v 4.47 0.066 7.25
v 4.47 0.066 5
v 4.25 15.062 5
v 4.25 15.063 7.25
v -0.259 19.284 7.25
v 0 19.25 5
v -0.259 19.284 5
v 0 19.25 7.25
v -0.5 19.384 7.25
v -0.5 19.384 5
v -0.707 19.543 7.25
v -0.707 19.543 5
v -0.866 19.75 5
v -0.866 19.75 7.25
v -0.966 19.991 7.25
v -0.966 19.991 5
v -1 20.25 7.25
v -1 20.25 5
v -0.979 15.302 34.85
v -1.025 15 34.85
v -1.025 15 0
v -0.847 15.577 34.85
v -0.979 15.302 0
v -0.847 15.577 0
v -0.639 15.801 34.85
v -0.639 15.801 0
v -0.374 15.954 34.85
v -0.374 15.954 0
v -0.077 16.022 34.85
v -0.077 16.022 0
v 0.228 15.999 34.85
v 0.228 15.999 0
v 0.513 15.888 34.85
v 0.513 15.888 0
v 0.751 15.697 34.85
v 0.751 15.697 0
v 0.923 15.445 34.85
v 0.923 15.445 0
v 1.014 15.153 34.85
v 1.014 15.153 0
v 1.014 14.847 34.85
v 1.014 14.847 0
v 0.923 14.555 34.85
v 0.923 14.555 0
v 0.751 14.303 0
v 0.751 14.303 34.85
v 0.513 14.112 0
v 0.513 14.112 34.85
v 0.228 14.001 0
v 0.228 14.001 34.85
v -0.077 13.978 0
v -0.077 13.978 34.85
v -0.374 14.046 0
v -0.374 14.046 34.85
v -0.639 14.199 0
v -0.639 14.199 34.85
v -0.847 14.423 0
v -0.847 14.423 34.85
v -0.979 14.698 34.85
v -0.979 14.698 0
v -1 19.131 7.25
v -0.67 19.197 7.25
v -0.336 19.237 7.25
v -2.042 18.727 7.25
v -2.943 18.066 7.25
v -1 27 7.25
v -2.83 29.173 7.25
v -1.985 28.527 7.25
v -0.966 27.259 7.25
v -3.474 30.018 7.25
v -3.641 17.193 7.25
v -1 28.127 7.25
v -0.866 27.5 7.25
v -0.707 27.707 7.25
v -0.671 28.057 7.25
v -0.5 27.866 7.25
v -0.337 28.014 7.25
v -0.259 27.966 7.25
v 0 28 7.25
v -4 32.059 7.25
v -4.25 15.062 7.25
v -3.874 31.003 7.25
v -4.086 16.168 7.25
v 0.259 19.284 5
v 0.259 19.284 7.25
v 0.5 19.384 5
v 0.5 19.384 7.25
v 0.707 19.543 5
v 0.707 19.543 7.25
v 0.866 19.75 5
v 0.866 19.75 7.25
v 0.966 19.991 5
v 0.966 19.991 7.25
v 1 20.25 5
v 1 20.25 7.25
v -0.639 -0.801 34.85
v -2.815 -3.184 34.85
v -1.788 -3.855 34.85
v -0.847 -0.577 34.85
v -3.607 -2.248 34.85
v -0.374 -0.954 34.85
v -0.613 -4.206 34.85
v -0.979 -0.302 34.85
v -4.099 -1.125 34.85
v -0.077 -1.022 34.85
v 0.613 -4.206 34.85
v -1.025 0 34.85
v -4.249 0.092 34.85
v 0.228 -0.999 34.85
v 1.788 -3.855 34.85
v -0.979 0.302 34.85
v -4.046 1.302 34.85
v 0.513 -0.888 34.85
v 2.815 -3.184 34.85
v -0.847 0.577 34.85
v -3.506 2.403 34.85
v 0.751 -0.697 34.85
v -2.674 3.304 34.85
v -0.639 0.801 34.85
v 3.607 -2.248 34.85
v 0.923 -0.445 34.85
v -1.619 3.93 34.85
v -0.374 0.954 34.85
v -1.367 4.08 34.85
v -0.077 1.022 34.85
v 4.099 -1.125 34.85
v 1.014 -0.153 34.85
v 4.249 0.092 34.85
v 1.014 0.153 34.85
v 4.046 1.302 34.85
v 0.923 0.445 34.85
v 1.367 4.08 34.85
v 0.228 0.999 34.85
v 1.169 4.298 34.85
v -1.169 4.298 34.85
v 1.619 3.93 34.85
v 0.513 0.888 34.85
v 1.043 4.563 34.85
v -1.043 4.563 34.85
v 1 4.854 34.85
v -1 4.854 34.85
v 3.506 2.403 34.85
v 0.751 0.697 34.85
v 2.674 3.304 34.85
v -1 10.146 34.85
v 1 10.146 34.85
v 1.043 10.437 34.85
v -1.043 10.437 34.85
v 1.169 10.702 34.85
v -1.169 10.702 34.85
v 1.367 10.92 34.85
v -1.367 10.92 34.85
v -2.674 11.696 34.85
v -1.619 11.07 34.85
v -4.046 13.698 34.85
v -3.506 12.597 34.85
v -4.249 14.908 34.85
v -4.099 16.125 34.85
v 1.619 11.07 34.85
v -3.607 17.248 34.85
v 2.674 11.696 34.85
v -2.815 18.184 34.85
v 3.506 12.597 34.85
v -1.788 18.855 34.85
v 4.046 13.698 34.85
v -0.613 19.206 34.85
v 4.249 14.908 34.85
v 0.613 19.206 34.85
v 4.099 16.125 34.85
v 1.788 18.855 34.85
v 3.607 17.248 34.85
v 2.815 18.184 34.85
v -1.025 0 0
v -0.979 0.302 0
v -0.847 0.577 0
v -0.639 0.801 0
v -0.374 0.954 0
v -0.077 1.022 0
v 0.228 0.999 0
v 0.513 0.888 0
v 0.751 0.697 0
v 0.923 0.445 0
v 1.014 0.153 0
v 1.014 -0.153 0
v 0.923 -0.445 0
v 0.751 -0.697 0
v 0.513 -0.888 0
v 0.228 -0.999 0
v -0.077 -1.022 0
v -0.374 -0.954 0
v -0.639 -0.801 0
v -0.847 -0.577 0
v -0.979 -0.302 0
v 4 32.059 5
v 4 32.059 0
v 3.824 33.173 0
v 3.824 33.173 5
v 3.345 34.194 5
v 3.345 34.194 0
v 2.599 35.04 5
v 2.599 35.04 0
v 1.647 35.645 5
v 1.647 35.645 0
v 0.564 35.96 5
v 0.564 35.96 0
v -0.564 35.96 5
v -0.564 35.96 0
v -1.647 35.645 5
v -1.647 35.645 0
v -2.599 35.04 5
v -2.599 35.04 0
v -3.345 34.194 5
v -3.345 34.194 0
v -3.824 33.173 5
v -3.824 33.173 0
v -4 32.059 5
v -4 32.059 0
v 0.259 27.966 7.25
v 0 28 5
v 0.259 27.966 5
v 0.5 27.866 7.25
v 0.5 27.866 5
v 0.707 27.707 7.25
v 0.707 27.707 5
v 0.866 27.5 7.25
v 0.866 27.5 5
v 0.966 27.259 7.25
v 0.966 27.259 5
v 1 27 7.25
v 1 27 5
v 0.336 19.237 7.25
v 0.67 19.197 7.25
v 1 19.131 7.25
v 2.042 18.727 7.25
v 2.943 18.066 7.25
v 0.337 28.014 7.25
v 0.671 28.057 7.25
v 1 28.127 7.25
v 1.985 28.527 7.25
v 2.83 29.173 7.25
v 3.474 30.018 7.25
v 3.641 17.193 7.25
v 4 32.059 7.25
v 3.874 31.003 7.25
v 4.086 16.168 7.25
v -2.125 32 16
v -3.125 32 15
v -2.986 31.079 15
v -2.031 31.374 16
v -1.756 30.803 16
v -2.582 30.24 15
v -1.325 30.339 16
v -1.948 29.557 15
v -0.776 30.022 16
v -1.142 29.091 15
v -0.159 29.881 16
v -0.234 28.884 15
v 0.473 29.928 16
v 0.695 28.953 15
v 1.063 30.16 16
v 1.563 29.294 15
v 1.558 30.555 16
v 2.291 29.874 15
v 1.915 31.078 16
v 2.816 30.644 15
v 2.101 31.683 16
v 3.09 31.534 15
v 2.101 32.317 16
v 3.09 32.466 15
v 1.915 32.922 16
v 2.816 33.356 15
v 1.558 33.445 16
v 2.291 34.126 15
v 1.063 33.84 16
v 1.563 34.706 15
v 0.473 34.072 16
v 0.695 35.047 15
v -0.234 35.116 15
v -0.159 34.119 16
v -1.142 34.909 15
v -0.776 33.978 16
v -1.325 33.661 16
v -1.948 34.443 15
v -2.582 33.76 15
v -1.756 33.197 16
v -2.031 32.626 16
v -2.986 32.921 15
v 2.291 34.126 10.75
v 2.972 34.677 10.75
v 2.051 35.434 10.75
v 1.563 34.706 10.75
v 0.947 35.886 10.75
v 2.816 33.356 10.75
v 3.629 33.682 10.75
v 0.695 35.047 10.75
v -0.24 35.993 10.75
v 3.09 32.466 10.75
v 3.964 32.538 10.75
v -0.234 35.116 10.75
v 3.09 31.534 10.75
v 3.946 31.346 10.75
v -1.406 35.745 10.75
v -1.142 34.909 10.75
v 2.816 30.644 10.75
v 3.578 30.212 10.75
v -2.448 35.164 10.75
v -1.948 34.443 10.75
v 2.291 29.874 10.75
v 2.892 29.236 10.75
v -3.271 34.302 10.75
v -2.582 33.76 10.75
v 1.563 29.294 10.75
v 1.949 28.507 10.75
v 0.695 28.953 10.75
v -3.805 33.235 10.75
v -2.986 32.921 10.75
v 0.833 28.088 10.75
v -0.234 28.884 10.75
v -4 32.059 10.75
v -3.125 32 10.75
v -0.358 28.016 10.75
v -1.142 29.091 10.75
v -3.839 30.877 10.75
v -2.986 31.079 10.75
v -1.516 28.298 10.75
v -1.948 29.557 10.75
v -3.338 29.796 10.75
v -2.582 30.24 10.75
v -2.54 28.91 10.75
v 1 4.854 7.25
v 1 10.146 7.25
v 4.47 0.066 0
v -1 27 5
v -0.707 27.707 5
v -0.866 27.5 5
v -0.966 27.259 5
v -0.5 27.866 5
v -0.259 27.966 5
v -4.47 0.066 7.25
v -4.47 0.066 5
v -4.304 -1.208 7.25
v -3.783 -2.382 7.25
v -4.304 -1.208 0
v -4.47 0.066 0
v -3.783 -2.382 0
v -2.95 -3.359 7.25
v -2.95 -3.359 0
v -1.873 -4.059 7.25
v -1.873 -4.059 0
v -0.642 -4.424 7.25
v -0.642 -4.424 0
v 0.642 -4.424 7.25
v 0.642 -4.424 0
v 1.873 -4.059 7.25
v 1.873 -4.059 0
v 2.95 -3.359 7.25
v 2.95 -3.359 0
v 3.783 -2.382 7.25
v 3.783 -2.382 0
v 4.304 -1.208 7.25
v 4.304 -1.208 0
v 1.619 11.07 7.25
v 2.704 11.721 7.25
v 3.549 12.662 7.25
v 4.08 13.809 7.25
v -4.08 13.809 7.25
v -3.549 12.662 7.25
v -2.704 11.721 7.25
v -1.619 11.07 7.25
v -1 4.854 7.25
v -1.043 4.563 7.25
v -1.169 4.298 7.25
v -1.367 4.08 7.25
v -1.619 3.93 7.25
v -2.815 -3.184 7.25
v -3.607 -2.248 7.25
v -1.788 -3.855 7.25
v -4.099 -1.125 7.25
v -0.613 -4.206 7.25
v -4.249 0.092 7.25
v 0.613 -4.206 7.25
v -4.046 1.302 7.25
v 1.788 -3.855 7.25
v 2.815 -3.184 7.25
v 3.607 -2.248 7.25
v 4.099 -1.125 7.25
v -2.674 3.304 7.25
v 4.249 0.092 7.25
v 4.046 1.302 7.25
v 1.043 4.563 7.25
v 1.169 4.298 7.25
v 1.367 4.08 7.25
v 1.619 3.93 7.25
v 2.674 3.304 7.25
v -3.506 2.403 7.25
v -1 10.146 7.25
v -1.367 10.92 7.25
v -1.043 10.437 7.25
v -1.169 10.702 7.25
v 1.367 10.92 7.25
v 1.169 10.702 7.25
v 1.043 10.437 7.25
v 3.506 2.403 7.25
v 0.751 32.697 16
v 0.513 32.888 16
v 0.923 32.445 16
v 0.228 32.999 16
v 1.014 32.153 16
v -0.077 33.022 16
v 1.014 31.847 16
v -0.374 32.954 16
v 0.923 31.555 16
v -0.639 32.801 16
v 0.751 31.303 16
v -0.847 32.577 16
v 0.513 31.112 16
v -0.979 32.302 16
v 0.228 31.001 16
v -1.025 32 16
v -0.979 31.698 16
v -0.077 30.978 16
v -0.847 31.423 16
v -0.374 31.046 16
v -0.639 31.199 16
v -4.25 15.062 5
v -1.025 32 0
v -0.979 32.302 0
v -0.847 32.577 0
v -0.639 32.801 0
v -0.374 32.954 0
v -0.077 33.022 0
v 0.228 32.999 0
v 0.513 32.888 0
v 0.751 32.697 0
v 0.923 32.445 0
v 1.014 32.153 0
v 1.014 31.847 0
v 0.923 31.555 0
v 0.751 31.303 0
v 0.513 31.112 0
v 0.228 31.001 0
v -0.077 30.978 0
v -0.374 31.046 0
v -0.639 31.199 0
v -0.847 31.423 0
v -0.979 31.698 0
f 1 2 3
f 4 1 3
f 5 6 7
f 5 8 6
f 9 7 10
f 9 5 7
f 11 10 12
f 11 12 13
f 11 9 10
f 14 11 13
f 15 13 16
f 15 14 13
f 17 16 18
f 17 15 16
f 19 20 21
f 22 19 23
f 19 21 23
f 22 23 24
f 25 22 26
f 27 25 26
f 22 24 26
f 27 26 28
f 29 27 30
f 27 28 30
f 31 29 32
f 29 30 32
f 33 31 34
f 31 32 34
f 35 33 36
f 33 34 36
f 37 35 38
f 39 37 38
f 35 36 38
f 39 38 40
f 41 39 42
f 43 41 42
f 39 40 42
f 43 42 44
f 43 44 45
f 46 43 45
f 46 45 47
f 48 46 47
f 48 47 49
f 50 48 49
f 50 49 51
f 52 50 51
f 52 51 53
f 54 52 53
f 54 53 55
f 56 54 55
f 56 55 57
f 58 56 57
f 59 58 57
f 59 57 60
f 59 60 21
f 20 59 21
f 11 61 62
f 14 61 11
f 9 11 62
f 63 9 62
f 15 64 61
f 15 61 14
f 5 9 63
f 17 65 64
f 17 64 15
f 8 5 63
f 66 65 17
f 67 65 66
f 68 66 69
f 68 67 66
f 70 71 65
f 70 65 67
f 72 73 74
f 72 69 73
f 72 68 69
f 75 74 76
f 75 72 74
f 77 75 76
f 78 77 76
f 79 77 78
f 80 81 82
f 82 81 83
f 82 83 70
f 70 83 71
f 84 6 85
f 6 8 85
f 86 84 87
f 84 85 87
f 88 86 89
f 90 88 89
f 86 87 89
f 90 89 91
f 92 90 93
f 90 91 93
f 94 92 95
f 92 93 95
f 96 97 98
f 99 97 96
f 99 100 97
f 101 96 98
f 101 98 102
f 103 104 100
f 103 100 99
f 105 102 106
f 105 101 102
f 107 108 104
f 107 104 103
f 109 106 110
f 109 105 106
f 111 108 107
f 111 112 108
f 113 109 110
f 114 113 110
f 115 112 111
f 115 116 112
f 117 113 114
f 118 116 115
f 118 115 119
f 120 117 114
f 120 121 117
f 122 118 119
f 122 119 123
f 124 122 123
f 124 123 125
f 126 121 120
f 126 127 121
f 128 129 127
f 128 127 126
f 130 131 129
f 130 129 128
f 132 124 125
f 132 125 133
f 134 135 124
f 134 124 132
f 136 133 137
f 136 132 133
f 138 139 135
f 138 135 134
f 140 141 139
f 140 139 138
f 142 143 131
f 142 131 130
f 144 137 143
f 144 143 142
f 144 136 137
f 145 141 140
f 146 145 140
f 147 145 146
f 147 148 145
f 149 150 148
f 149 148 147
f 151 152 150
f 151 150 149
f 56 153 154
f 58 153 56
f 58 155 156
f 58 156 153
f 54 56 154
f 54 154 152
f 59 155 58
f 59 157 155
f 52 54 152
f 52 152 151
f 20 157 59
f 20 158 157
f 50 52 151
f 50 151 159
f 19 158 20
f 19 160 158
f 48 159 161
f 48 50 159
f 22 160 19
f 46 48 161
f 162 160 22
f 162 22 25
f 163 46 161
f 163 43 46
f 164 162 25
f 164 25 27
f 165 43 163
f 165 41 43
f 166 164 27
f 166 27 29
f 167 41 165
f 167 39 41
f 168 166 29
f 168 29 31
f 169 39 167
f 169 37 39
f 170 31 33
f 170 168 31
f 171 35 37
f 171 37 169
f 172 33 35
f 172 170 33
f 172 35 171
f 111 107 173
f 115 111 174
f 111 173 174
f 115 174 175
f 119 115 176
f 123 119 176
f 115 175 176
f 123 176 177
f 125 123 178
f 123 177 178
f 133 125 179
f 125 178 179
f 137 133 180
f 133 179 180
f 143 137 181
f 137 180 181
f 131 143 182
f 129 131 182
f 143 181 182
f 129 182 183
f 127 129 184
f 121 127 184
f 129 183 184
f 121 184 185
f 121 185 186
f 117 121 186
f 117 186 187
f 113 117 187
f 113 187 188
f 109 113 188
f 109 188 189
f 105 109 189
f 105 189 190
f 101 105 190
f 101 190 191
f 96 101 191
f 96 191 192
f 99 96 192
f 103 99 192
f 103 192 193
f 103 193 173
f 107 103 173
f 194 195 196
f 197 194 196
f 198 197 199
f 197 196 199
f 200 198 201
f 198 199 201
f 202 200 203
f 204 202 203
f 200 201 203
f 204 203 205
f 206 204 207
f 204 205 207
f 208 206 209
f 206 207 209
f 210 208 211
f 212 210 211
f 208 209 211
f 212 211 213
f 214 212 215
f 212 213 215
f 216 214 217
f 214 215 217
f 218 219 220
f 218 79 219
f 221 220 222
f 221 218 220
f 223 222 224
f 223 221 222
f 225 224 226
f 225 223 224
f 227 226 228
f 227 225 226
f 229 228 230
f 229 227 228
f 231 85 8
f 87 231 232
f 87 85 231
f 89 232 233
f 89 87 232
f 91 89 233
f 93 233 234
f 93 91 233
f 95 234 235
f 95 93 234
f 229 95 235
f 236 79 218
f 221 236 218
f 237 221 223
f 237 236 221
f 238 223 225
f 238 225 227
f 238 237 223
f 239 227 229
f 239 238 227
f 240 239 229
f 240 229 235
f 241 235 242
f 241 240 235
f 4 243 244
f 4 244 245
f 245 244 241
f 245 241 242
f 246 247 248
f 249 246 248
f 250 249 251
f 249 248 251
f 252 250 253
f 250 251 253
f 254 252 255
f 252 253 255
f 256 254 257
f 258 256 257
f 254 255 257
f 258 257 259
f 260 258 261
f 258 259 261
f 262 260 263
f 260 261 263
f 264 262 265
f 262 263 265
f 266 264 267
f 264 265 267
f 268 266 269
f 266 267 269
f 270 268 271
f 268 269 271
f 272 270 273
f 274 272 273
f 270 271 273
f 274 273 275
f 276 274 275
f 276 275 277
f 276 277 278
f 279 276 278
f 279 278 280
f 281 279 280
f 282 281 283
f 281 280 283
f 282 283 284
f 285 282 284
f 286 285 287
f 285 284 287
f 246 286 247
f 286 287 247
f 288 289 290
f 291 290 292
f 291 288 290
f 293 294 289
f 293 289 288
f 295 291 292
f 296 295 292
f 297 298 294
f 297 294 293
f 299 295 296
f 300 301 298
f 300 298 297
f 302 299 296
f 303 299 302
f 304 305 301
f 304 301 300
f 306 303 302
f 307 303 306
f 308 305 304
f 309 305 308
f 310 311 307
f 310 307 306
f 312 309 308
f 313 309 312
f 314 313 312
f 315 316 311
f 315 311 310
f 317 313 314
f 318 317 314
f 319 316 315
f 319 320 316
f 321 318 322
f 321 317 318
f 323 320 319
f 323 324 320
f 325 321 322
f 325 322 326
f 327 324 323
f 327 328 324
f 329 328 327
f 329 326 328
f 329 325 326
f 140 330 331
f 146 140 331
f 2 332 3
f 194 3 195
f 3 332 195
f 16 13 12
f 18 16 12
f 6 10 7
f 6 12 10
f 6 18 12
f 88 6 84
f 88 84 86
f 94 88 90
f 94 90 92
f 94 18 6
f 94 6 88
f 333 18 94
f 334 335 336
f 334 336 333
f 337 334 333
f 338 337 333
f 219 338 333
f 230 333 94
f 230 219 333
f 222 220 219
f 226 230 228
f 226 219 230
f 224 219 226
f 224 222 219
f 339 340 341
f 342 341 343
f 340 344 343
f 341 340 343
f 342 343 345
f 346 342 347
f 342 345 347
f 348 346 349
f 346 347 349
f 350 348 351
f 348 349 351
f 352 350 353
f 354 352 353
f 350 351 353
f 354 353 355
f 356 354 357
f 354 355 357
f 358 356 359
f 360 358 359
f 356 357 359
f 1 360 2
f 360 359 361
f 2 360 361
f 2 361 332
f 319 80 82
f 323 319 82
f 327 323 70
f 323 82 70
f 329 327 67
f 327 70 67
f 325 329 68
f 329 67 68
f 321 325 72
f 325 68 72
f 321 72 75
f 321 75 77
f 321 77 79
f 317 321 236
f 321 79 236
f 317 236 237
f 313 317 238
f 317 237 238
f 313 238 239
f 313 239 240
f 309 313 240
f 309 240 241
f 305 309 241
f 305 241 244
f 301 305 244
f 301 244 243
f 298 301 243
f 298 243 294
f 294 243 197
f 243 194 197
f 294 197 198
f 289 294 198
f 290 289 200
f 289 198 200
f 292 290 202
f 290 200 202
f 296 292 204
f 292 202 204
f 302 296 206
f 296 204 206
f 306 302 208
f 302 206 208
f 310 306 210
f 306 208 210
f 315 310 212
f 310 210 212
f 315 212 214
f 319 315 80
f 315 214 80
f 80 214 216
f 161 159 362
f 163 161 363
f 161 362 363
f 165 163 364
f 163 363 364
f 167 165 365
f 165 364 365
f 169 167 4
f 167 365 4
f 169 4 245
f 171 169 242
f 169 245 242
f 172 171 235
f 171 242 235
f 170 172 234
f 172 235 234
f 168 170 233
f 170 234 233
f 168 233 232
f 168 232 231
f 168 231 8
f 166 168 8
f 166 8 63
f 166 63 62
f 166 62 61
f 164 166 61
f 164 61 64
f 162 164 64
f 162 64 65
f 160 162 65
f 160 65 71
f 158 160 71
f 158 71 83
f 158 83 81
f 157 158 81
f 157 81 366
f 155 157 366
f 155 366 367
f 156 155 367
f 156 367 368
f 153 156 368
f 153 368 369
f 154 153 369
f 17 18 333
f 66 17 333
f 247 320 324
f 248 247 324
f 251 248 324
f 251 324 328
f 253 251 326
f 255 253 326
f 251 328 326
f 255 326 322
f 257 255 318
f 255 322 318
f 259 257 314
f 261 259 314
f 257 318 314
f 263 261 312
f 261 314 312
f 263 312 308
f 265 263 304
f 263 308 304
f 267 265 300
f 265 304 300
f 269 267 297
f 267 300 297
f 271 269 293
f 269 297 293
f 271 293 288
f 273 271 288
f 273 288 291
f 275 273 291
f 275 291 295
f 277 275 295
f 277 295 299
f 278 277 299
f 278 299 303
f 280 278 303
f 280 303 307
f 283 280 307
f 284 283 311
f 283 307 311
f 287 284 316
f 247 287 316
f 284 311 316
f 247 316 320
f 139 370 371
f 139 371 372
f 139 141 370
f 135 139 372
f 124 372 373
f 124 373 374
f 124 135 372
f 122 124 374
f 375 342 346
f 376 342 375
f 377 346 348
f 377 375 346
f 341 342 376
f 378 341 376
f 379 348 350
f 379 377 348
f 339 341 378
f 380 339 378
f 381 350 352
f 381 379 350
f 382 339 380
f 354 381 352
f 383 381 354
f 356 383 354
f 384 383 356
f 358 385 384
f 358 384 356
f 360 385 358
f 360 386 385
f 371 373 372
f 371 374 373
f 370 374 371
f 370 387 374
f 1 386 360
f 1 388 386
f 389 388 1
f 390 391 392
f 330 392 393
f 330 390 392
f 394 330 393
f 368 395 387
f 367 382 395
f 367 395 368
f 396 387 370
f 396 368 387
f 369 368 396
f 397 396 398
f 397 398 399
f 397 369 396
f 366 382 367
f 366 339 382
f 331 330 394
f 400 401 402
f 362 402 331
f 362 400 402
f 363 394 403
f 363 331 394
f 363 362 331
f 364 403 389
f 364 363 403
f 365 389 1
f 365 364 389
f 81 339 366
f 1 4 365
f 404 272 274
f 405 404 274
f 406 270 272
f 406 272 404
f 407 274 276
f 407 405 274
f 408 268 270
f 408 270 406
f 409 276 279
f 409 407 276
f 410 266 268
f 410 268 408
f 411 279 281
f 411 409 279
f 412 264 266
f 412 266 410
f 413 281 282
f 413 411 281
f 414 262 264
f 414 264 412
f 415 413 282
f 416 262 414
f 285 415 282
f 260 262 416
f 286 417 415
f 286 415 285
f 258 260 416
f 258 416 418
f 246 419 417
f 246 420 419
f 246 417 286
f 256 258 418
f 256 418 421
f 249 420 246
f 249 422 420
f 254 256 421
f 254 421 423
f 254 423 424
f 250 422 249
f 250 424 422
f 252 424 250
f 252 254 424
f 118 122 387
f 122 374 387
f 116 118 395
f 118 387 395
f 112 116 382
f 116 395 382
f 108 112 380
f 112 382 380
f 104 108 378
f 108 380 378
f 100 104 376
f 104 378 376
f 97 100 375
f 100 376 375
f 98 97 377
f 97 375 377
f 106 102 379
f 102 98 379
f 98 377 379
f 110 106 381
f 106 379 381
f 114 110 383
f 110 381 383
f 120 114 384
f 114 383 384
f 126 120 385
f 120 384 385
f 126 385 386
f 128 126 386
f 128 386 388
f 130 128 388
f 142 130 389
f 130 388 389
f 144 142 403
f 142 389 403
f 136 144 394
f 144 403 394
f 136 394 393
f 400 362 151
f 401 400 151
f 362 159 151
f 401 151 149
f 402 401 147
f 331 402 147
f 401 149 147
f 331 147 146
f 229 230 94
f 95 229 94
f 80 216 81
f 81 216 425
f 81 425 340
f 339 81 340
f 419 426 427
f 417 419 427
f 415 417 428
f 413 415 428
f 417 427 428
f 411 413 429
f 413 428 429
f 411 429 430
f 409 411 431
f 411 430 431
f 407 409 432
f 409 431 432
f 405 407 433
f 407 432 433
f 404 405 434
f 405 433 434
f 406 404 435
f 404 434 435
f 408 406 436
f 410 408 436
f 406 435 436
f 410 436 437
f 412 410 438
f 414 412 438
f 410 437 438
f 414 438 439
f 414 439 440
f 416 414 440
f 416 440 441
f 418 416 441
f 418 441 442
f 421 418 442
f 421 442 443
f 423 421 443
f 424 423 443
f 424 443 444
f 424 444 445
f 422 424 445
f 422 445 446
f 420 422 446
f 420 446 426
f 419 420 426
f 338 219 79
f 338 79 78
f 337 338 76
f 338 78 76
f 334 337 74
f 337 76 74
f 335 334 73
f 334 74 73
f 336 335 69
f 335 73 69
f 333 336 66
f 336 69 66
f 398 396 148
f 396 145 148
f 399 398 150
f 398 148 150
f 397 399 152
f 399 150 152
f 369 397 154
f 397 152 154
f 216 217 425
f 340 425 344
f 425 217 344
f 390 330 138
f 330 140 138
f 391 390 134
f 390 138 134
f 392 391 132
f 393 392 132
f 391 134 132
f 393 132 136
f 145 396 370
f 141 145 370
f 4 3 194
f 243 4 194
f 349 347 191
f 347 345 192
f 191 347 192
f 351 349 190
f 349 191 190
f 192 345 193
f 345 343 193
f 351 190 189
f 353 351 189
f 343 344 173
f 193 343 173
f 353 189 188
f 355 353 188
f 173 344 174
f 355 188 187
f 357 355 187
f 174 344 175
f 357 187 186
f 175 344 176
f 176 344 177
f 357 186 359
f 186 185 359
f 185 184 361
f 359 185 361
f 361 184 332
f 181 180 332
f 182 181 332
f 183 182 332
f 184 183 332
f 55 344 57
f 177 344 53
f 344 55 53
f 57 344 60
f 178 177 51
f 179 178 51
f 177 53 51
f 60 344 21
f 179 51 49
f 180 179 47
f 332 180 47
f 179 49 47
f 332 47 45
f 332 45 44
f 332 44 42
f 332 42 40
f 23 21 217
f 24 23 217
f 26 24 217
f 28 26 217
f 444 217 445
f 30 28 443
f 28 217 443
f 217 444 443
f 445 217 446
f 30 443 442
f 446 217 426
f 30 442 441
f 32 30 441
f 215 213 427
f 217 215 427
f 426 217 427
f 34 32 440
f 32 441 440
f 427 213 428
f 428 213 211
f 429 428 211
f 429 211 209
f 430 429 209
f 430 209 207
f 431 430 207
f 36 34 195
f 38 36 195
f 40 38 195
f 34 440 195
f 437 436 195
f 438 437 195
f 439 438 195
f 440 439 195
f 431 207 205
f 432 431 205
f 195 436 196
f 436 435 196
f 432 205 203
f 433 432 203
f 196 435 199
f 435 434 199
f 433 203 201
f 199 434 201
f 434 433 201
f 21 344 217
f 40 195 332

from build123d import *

# Parameters (mm, degrees)
BOSS_EXTRUDE1_DEPTH      = 5
BOSS_EXTRUDE3_START      = 5
SKETCH1_5_R              = 4
BOSS_EXTRUDE3_DEPTH      = 5.75
BOSS_EXTRUDE2_START      = 10.75
SKETCH1_4_R              = 3.125
BOSS_EXTRUDE2_DEPTH      = 5.25
BOSS_EXTRUDE4_START      = 5
SKETCH1_6_R              = 4.25
BOSS_EXTRUDE4_DEPTH      = 29.85
BOSS_EXTRUDE5_DEPTH      = 2.25
BOSS_EXTRUDE6_DEPTH      = 29.85
FILLET1_R                = 1
M2_5X0_45_TAPPED_HOLE1_D = 2.05
CHAMFER1_SIZE            = 1


# Read off the part's stored shape, not the designer's step: Boss-Extrude5
with BuildPart() as part:
    # Sketch1 → Boss-Extrude1 (new body)
    with BuildSketch(Plane.XY):
        with BuildLine():
            ThreePointArc((3.999567451, 32.058823529), (0, 36), (-3.999567451, 32.058823529))
            Line((-3.999567451, 32.058823529), (-4.470104798, 0.065743945))
            ThreePointArc((-4.470104798, 0.065743945), (0, -4.470588235), (4.470104798, 0.065743945))
            Line((4.470104798, 0.065743945), (3.999567451, 32.058823529))
        make_face()
    extrude(amount=BOSS_EXTRUDE1_DEPTH)

    # Sketch1<5> → Boss-Extrude3 (add)
    with BuildSketch(Plane.XY.offset(BOSS_EXTRUDE3_START)):
        with Locations(Location((0, 32, 0), (0, 0, 179.157384634))):
            Circle(SKETCH1_5_R)
    extrude(amount=BOSS_EXTRUDE3_DEPTH)

    # Sketch1<4> → Boss-Extrude2 (add)
    with BuildSketch(Plane.XY.offset(BOSS_EXTRUDE2_START)):
        with Locations(Location((0, 32, 0), (0, 0, 180))):
            Circle(SKETCH1_4_R)
    extrude(amount=BOSS_EXTRUDE2_DEPTH)

    # Sketch1<6> → Boss-Extrude4 (add)
    with BuildSketch(Plane.XY.offset(BOSS_EXTRUDE4_START)):
        Circle(SKETCH1_6_R)
        with Locations(Location((0, 15, 0), (0, 0, 179.157384634))):
            Circle(SKETCH1_6_R)
    extrude(amount=BOSS_EXTRUDE4_DEPTH)

    # Boss-Extrude5 outline → Boss-Extrude5 (add)
    with BuildSketch(Plane.XY.offset(5)):
        with BuildLine():
            Line((-4.249540417, 15.06249996), (-4.470104798, 0.065743945))
            ThreePointArc((-4.470104798, 0.065743945), (0, -4.470588235), (4.470104798, 0.065743945))
            Line((4.470104798, 0.065743945), (4.249540416, 15.062500001))
            ThreePointArc((4.249540416, 15.062500001), (3.35933087, 12.396656745), (1, 10.86932209))
            Line((1, 10.86932209), (1, 4.13067791))
            ThreePointArc((1, 4.13067791), (0, -4.25), (-1, 4.13067791))
            Line((-1, 4.13067791), (-1, 10.86932209))
            ThreePointArc((-1, 10.86932209), (-3.359330858, 12.396656729), (-4.249540417, 15.06249996))
        make_face()
        with BuildLine():
            Line((-3.999567451, 32.058823529), (-4.249540417, 15.06249996))
            ThreePointArc((-4.249540417, 15.06249996), (-3.320683154, 17.652463646), (-1, 19.13067791))
            Line((-1, 19.13067791), (-1, 28.127016654))
            ThreePointArc((-1, 28.127016654), (-3.18020361, 29.573829149), (-3.999567451, 32.058823529))
        make_face()
        with BuildLine():
            ThreePointArc((1, 19.13067791), (3.320683141, 17.652463662), (4.249540416, 15.062500001))
            Line((4.249540416, 15.062500001), (3.999567451, 32.058823529))
            ThreePointArc((3.999567451, 32.058823529), (3.18020361, 29.573829149), (1, 28.127016654))
            Line((1, 28.127016654), (1, 19.13067791))
        make_face()
    extrude(amount=BOSS_EXTRUDE5_DEPTH)

    # Sketch2<3> → Boss-Extrude6 (add)
    with BuildSketch(Plane.XY.offset(5)):
        with BuildLine():
            ThreePointArc((1, 10.86932209), (0, 10.75), (-1, 10.86932209))
            Line((-1, 10.86932209), (-1, 4.13067791))
            ThreePointArc((-1, 4.13067791), (0, 4.25), (1, 4.13067791))
            Line((1, 4.13067791), (1, 10.86932209))
        make_face()
    extrude(amount=BOSS_EXTRUDE6_DEPTH)

    # Fillet1
    fillet1_edges = [part.edges().sort_by_distance(p)[0] for p in [
        (1, 4.13067791, 21.05),
        (1, 10.86932209, 21.05),
        (-1, 4.13067791, 21.05),
        (-1, 10.86932209, 21.05),
        (-1, 28.127016654, 6.125),
        (1, 28.127016654, 6.125),
        (-1, 19.13067791, 6.125),
        (1, 19.13067791, 6.125),
    ]]
    fillet(fillet1_edges, radius=FILLET1_R - 0.0001)  # a hair under: the kernel refuses the full size

    # M2.5x0.45 Tapped Hole1 (through all)
    with Locations(Plane.XY.offset(34.85)):
        with Locations((0, 15), (0, 0), (0, 32)):
            Hole(M2_5X0_45_TAPPED_HOLE1_D / 2)

    # Chamfer1
    chamfer1_edges = [part.edges().sort_by_distance(p)[0] for p in [
        (3.125, 32, 16),
    ]]
    chamfer(chamfer1_edges, length=CHAMFER1_SIZE)


solid = part.part
